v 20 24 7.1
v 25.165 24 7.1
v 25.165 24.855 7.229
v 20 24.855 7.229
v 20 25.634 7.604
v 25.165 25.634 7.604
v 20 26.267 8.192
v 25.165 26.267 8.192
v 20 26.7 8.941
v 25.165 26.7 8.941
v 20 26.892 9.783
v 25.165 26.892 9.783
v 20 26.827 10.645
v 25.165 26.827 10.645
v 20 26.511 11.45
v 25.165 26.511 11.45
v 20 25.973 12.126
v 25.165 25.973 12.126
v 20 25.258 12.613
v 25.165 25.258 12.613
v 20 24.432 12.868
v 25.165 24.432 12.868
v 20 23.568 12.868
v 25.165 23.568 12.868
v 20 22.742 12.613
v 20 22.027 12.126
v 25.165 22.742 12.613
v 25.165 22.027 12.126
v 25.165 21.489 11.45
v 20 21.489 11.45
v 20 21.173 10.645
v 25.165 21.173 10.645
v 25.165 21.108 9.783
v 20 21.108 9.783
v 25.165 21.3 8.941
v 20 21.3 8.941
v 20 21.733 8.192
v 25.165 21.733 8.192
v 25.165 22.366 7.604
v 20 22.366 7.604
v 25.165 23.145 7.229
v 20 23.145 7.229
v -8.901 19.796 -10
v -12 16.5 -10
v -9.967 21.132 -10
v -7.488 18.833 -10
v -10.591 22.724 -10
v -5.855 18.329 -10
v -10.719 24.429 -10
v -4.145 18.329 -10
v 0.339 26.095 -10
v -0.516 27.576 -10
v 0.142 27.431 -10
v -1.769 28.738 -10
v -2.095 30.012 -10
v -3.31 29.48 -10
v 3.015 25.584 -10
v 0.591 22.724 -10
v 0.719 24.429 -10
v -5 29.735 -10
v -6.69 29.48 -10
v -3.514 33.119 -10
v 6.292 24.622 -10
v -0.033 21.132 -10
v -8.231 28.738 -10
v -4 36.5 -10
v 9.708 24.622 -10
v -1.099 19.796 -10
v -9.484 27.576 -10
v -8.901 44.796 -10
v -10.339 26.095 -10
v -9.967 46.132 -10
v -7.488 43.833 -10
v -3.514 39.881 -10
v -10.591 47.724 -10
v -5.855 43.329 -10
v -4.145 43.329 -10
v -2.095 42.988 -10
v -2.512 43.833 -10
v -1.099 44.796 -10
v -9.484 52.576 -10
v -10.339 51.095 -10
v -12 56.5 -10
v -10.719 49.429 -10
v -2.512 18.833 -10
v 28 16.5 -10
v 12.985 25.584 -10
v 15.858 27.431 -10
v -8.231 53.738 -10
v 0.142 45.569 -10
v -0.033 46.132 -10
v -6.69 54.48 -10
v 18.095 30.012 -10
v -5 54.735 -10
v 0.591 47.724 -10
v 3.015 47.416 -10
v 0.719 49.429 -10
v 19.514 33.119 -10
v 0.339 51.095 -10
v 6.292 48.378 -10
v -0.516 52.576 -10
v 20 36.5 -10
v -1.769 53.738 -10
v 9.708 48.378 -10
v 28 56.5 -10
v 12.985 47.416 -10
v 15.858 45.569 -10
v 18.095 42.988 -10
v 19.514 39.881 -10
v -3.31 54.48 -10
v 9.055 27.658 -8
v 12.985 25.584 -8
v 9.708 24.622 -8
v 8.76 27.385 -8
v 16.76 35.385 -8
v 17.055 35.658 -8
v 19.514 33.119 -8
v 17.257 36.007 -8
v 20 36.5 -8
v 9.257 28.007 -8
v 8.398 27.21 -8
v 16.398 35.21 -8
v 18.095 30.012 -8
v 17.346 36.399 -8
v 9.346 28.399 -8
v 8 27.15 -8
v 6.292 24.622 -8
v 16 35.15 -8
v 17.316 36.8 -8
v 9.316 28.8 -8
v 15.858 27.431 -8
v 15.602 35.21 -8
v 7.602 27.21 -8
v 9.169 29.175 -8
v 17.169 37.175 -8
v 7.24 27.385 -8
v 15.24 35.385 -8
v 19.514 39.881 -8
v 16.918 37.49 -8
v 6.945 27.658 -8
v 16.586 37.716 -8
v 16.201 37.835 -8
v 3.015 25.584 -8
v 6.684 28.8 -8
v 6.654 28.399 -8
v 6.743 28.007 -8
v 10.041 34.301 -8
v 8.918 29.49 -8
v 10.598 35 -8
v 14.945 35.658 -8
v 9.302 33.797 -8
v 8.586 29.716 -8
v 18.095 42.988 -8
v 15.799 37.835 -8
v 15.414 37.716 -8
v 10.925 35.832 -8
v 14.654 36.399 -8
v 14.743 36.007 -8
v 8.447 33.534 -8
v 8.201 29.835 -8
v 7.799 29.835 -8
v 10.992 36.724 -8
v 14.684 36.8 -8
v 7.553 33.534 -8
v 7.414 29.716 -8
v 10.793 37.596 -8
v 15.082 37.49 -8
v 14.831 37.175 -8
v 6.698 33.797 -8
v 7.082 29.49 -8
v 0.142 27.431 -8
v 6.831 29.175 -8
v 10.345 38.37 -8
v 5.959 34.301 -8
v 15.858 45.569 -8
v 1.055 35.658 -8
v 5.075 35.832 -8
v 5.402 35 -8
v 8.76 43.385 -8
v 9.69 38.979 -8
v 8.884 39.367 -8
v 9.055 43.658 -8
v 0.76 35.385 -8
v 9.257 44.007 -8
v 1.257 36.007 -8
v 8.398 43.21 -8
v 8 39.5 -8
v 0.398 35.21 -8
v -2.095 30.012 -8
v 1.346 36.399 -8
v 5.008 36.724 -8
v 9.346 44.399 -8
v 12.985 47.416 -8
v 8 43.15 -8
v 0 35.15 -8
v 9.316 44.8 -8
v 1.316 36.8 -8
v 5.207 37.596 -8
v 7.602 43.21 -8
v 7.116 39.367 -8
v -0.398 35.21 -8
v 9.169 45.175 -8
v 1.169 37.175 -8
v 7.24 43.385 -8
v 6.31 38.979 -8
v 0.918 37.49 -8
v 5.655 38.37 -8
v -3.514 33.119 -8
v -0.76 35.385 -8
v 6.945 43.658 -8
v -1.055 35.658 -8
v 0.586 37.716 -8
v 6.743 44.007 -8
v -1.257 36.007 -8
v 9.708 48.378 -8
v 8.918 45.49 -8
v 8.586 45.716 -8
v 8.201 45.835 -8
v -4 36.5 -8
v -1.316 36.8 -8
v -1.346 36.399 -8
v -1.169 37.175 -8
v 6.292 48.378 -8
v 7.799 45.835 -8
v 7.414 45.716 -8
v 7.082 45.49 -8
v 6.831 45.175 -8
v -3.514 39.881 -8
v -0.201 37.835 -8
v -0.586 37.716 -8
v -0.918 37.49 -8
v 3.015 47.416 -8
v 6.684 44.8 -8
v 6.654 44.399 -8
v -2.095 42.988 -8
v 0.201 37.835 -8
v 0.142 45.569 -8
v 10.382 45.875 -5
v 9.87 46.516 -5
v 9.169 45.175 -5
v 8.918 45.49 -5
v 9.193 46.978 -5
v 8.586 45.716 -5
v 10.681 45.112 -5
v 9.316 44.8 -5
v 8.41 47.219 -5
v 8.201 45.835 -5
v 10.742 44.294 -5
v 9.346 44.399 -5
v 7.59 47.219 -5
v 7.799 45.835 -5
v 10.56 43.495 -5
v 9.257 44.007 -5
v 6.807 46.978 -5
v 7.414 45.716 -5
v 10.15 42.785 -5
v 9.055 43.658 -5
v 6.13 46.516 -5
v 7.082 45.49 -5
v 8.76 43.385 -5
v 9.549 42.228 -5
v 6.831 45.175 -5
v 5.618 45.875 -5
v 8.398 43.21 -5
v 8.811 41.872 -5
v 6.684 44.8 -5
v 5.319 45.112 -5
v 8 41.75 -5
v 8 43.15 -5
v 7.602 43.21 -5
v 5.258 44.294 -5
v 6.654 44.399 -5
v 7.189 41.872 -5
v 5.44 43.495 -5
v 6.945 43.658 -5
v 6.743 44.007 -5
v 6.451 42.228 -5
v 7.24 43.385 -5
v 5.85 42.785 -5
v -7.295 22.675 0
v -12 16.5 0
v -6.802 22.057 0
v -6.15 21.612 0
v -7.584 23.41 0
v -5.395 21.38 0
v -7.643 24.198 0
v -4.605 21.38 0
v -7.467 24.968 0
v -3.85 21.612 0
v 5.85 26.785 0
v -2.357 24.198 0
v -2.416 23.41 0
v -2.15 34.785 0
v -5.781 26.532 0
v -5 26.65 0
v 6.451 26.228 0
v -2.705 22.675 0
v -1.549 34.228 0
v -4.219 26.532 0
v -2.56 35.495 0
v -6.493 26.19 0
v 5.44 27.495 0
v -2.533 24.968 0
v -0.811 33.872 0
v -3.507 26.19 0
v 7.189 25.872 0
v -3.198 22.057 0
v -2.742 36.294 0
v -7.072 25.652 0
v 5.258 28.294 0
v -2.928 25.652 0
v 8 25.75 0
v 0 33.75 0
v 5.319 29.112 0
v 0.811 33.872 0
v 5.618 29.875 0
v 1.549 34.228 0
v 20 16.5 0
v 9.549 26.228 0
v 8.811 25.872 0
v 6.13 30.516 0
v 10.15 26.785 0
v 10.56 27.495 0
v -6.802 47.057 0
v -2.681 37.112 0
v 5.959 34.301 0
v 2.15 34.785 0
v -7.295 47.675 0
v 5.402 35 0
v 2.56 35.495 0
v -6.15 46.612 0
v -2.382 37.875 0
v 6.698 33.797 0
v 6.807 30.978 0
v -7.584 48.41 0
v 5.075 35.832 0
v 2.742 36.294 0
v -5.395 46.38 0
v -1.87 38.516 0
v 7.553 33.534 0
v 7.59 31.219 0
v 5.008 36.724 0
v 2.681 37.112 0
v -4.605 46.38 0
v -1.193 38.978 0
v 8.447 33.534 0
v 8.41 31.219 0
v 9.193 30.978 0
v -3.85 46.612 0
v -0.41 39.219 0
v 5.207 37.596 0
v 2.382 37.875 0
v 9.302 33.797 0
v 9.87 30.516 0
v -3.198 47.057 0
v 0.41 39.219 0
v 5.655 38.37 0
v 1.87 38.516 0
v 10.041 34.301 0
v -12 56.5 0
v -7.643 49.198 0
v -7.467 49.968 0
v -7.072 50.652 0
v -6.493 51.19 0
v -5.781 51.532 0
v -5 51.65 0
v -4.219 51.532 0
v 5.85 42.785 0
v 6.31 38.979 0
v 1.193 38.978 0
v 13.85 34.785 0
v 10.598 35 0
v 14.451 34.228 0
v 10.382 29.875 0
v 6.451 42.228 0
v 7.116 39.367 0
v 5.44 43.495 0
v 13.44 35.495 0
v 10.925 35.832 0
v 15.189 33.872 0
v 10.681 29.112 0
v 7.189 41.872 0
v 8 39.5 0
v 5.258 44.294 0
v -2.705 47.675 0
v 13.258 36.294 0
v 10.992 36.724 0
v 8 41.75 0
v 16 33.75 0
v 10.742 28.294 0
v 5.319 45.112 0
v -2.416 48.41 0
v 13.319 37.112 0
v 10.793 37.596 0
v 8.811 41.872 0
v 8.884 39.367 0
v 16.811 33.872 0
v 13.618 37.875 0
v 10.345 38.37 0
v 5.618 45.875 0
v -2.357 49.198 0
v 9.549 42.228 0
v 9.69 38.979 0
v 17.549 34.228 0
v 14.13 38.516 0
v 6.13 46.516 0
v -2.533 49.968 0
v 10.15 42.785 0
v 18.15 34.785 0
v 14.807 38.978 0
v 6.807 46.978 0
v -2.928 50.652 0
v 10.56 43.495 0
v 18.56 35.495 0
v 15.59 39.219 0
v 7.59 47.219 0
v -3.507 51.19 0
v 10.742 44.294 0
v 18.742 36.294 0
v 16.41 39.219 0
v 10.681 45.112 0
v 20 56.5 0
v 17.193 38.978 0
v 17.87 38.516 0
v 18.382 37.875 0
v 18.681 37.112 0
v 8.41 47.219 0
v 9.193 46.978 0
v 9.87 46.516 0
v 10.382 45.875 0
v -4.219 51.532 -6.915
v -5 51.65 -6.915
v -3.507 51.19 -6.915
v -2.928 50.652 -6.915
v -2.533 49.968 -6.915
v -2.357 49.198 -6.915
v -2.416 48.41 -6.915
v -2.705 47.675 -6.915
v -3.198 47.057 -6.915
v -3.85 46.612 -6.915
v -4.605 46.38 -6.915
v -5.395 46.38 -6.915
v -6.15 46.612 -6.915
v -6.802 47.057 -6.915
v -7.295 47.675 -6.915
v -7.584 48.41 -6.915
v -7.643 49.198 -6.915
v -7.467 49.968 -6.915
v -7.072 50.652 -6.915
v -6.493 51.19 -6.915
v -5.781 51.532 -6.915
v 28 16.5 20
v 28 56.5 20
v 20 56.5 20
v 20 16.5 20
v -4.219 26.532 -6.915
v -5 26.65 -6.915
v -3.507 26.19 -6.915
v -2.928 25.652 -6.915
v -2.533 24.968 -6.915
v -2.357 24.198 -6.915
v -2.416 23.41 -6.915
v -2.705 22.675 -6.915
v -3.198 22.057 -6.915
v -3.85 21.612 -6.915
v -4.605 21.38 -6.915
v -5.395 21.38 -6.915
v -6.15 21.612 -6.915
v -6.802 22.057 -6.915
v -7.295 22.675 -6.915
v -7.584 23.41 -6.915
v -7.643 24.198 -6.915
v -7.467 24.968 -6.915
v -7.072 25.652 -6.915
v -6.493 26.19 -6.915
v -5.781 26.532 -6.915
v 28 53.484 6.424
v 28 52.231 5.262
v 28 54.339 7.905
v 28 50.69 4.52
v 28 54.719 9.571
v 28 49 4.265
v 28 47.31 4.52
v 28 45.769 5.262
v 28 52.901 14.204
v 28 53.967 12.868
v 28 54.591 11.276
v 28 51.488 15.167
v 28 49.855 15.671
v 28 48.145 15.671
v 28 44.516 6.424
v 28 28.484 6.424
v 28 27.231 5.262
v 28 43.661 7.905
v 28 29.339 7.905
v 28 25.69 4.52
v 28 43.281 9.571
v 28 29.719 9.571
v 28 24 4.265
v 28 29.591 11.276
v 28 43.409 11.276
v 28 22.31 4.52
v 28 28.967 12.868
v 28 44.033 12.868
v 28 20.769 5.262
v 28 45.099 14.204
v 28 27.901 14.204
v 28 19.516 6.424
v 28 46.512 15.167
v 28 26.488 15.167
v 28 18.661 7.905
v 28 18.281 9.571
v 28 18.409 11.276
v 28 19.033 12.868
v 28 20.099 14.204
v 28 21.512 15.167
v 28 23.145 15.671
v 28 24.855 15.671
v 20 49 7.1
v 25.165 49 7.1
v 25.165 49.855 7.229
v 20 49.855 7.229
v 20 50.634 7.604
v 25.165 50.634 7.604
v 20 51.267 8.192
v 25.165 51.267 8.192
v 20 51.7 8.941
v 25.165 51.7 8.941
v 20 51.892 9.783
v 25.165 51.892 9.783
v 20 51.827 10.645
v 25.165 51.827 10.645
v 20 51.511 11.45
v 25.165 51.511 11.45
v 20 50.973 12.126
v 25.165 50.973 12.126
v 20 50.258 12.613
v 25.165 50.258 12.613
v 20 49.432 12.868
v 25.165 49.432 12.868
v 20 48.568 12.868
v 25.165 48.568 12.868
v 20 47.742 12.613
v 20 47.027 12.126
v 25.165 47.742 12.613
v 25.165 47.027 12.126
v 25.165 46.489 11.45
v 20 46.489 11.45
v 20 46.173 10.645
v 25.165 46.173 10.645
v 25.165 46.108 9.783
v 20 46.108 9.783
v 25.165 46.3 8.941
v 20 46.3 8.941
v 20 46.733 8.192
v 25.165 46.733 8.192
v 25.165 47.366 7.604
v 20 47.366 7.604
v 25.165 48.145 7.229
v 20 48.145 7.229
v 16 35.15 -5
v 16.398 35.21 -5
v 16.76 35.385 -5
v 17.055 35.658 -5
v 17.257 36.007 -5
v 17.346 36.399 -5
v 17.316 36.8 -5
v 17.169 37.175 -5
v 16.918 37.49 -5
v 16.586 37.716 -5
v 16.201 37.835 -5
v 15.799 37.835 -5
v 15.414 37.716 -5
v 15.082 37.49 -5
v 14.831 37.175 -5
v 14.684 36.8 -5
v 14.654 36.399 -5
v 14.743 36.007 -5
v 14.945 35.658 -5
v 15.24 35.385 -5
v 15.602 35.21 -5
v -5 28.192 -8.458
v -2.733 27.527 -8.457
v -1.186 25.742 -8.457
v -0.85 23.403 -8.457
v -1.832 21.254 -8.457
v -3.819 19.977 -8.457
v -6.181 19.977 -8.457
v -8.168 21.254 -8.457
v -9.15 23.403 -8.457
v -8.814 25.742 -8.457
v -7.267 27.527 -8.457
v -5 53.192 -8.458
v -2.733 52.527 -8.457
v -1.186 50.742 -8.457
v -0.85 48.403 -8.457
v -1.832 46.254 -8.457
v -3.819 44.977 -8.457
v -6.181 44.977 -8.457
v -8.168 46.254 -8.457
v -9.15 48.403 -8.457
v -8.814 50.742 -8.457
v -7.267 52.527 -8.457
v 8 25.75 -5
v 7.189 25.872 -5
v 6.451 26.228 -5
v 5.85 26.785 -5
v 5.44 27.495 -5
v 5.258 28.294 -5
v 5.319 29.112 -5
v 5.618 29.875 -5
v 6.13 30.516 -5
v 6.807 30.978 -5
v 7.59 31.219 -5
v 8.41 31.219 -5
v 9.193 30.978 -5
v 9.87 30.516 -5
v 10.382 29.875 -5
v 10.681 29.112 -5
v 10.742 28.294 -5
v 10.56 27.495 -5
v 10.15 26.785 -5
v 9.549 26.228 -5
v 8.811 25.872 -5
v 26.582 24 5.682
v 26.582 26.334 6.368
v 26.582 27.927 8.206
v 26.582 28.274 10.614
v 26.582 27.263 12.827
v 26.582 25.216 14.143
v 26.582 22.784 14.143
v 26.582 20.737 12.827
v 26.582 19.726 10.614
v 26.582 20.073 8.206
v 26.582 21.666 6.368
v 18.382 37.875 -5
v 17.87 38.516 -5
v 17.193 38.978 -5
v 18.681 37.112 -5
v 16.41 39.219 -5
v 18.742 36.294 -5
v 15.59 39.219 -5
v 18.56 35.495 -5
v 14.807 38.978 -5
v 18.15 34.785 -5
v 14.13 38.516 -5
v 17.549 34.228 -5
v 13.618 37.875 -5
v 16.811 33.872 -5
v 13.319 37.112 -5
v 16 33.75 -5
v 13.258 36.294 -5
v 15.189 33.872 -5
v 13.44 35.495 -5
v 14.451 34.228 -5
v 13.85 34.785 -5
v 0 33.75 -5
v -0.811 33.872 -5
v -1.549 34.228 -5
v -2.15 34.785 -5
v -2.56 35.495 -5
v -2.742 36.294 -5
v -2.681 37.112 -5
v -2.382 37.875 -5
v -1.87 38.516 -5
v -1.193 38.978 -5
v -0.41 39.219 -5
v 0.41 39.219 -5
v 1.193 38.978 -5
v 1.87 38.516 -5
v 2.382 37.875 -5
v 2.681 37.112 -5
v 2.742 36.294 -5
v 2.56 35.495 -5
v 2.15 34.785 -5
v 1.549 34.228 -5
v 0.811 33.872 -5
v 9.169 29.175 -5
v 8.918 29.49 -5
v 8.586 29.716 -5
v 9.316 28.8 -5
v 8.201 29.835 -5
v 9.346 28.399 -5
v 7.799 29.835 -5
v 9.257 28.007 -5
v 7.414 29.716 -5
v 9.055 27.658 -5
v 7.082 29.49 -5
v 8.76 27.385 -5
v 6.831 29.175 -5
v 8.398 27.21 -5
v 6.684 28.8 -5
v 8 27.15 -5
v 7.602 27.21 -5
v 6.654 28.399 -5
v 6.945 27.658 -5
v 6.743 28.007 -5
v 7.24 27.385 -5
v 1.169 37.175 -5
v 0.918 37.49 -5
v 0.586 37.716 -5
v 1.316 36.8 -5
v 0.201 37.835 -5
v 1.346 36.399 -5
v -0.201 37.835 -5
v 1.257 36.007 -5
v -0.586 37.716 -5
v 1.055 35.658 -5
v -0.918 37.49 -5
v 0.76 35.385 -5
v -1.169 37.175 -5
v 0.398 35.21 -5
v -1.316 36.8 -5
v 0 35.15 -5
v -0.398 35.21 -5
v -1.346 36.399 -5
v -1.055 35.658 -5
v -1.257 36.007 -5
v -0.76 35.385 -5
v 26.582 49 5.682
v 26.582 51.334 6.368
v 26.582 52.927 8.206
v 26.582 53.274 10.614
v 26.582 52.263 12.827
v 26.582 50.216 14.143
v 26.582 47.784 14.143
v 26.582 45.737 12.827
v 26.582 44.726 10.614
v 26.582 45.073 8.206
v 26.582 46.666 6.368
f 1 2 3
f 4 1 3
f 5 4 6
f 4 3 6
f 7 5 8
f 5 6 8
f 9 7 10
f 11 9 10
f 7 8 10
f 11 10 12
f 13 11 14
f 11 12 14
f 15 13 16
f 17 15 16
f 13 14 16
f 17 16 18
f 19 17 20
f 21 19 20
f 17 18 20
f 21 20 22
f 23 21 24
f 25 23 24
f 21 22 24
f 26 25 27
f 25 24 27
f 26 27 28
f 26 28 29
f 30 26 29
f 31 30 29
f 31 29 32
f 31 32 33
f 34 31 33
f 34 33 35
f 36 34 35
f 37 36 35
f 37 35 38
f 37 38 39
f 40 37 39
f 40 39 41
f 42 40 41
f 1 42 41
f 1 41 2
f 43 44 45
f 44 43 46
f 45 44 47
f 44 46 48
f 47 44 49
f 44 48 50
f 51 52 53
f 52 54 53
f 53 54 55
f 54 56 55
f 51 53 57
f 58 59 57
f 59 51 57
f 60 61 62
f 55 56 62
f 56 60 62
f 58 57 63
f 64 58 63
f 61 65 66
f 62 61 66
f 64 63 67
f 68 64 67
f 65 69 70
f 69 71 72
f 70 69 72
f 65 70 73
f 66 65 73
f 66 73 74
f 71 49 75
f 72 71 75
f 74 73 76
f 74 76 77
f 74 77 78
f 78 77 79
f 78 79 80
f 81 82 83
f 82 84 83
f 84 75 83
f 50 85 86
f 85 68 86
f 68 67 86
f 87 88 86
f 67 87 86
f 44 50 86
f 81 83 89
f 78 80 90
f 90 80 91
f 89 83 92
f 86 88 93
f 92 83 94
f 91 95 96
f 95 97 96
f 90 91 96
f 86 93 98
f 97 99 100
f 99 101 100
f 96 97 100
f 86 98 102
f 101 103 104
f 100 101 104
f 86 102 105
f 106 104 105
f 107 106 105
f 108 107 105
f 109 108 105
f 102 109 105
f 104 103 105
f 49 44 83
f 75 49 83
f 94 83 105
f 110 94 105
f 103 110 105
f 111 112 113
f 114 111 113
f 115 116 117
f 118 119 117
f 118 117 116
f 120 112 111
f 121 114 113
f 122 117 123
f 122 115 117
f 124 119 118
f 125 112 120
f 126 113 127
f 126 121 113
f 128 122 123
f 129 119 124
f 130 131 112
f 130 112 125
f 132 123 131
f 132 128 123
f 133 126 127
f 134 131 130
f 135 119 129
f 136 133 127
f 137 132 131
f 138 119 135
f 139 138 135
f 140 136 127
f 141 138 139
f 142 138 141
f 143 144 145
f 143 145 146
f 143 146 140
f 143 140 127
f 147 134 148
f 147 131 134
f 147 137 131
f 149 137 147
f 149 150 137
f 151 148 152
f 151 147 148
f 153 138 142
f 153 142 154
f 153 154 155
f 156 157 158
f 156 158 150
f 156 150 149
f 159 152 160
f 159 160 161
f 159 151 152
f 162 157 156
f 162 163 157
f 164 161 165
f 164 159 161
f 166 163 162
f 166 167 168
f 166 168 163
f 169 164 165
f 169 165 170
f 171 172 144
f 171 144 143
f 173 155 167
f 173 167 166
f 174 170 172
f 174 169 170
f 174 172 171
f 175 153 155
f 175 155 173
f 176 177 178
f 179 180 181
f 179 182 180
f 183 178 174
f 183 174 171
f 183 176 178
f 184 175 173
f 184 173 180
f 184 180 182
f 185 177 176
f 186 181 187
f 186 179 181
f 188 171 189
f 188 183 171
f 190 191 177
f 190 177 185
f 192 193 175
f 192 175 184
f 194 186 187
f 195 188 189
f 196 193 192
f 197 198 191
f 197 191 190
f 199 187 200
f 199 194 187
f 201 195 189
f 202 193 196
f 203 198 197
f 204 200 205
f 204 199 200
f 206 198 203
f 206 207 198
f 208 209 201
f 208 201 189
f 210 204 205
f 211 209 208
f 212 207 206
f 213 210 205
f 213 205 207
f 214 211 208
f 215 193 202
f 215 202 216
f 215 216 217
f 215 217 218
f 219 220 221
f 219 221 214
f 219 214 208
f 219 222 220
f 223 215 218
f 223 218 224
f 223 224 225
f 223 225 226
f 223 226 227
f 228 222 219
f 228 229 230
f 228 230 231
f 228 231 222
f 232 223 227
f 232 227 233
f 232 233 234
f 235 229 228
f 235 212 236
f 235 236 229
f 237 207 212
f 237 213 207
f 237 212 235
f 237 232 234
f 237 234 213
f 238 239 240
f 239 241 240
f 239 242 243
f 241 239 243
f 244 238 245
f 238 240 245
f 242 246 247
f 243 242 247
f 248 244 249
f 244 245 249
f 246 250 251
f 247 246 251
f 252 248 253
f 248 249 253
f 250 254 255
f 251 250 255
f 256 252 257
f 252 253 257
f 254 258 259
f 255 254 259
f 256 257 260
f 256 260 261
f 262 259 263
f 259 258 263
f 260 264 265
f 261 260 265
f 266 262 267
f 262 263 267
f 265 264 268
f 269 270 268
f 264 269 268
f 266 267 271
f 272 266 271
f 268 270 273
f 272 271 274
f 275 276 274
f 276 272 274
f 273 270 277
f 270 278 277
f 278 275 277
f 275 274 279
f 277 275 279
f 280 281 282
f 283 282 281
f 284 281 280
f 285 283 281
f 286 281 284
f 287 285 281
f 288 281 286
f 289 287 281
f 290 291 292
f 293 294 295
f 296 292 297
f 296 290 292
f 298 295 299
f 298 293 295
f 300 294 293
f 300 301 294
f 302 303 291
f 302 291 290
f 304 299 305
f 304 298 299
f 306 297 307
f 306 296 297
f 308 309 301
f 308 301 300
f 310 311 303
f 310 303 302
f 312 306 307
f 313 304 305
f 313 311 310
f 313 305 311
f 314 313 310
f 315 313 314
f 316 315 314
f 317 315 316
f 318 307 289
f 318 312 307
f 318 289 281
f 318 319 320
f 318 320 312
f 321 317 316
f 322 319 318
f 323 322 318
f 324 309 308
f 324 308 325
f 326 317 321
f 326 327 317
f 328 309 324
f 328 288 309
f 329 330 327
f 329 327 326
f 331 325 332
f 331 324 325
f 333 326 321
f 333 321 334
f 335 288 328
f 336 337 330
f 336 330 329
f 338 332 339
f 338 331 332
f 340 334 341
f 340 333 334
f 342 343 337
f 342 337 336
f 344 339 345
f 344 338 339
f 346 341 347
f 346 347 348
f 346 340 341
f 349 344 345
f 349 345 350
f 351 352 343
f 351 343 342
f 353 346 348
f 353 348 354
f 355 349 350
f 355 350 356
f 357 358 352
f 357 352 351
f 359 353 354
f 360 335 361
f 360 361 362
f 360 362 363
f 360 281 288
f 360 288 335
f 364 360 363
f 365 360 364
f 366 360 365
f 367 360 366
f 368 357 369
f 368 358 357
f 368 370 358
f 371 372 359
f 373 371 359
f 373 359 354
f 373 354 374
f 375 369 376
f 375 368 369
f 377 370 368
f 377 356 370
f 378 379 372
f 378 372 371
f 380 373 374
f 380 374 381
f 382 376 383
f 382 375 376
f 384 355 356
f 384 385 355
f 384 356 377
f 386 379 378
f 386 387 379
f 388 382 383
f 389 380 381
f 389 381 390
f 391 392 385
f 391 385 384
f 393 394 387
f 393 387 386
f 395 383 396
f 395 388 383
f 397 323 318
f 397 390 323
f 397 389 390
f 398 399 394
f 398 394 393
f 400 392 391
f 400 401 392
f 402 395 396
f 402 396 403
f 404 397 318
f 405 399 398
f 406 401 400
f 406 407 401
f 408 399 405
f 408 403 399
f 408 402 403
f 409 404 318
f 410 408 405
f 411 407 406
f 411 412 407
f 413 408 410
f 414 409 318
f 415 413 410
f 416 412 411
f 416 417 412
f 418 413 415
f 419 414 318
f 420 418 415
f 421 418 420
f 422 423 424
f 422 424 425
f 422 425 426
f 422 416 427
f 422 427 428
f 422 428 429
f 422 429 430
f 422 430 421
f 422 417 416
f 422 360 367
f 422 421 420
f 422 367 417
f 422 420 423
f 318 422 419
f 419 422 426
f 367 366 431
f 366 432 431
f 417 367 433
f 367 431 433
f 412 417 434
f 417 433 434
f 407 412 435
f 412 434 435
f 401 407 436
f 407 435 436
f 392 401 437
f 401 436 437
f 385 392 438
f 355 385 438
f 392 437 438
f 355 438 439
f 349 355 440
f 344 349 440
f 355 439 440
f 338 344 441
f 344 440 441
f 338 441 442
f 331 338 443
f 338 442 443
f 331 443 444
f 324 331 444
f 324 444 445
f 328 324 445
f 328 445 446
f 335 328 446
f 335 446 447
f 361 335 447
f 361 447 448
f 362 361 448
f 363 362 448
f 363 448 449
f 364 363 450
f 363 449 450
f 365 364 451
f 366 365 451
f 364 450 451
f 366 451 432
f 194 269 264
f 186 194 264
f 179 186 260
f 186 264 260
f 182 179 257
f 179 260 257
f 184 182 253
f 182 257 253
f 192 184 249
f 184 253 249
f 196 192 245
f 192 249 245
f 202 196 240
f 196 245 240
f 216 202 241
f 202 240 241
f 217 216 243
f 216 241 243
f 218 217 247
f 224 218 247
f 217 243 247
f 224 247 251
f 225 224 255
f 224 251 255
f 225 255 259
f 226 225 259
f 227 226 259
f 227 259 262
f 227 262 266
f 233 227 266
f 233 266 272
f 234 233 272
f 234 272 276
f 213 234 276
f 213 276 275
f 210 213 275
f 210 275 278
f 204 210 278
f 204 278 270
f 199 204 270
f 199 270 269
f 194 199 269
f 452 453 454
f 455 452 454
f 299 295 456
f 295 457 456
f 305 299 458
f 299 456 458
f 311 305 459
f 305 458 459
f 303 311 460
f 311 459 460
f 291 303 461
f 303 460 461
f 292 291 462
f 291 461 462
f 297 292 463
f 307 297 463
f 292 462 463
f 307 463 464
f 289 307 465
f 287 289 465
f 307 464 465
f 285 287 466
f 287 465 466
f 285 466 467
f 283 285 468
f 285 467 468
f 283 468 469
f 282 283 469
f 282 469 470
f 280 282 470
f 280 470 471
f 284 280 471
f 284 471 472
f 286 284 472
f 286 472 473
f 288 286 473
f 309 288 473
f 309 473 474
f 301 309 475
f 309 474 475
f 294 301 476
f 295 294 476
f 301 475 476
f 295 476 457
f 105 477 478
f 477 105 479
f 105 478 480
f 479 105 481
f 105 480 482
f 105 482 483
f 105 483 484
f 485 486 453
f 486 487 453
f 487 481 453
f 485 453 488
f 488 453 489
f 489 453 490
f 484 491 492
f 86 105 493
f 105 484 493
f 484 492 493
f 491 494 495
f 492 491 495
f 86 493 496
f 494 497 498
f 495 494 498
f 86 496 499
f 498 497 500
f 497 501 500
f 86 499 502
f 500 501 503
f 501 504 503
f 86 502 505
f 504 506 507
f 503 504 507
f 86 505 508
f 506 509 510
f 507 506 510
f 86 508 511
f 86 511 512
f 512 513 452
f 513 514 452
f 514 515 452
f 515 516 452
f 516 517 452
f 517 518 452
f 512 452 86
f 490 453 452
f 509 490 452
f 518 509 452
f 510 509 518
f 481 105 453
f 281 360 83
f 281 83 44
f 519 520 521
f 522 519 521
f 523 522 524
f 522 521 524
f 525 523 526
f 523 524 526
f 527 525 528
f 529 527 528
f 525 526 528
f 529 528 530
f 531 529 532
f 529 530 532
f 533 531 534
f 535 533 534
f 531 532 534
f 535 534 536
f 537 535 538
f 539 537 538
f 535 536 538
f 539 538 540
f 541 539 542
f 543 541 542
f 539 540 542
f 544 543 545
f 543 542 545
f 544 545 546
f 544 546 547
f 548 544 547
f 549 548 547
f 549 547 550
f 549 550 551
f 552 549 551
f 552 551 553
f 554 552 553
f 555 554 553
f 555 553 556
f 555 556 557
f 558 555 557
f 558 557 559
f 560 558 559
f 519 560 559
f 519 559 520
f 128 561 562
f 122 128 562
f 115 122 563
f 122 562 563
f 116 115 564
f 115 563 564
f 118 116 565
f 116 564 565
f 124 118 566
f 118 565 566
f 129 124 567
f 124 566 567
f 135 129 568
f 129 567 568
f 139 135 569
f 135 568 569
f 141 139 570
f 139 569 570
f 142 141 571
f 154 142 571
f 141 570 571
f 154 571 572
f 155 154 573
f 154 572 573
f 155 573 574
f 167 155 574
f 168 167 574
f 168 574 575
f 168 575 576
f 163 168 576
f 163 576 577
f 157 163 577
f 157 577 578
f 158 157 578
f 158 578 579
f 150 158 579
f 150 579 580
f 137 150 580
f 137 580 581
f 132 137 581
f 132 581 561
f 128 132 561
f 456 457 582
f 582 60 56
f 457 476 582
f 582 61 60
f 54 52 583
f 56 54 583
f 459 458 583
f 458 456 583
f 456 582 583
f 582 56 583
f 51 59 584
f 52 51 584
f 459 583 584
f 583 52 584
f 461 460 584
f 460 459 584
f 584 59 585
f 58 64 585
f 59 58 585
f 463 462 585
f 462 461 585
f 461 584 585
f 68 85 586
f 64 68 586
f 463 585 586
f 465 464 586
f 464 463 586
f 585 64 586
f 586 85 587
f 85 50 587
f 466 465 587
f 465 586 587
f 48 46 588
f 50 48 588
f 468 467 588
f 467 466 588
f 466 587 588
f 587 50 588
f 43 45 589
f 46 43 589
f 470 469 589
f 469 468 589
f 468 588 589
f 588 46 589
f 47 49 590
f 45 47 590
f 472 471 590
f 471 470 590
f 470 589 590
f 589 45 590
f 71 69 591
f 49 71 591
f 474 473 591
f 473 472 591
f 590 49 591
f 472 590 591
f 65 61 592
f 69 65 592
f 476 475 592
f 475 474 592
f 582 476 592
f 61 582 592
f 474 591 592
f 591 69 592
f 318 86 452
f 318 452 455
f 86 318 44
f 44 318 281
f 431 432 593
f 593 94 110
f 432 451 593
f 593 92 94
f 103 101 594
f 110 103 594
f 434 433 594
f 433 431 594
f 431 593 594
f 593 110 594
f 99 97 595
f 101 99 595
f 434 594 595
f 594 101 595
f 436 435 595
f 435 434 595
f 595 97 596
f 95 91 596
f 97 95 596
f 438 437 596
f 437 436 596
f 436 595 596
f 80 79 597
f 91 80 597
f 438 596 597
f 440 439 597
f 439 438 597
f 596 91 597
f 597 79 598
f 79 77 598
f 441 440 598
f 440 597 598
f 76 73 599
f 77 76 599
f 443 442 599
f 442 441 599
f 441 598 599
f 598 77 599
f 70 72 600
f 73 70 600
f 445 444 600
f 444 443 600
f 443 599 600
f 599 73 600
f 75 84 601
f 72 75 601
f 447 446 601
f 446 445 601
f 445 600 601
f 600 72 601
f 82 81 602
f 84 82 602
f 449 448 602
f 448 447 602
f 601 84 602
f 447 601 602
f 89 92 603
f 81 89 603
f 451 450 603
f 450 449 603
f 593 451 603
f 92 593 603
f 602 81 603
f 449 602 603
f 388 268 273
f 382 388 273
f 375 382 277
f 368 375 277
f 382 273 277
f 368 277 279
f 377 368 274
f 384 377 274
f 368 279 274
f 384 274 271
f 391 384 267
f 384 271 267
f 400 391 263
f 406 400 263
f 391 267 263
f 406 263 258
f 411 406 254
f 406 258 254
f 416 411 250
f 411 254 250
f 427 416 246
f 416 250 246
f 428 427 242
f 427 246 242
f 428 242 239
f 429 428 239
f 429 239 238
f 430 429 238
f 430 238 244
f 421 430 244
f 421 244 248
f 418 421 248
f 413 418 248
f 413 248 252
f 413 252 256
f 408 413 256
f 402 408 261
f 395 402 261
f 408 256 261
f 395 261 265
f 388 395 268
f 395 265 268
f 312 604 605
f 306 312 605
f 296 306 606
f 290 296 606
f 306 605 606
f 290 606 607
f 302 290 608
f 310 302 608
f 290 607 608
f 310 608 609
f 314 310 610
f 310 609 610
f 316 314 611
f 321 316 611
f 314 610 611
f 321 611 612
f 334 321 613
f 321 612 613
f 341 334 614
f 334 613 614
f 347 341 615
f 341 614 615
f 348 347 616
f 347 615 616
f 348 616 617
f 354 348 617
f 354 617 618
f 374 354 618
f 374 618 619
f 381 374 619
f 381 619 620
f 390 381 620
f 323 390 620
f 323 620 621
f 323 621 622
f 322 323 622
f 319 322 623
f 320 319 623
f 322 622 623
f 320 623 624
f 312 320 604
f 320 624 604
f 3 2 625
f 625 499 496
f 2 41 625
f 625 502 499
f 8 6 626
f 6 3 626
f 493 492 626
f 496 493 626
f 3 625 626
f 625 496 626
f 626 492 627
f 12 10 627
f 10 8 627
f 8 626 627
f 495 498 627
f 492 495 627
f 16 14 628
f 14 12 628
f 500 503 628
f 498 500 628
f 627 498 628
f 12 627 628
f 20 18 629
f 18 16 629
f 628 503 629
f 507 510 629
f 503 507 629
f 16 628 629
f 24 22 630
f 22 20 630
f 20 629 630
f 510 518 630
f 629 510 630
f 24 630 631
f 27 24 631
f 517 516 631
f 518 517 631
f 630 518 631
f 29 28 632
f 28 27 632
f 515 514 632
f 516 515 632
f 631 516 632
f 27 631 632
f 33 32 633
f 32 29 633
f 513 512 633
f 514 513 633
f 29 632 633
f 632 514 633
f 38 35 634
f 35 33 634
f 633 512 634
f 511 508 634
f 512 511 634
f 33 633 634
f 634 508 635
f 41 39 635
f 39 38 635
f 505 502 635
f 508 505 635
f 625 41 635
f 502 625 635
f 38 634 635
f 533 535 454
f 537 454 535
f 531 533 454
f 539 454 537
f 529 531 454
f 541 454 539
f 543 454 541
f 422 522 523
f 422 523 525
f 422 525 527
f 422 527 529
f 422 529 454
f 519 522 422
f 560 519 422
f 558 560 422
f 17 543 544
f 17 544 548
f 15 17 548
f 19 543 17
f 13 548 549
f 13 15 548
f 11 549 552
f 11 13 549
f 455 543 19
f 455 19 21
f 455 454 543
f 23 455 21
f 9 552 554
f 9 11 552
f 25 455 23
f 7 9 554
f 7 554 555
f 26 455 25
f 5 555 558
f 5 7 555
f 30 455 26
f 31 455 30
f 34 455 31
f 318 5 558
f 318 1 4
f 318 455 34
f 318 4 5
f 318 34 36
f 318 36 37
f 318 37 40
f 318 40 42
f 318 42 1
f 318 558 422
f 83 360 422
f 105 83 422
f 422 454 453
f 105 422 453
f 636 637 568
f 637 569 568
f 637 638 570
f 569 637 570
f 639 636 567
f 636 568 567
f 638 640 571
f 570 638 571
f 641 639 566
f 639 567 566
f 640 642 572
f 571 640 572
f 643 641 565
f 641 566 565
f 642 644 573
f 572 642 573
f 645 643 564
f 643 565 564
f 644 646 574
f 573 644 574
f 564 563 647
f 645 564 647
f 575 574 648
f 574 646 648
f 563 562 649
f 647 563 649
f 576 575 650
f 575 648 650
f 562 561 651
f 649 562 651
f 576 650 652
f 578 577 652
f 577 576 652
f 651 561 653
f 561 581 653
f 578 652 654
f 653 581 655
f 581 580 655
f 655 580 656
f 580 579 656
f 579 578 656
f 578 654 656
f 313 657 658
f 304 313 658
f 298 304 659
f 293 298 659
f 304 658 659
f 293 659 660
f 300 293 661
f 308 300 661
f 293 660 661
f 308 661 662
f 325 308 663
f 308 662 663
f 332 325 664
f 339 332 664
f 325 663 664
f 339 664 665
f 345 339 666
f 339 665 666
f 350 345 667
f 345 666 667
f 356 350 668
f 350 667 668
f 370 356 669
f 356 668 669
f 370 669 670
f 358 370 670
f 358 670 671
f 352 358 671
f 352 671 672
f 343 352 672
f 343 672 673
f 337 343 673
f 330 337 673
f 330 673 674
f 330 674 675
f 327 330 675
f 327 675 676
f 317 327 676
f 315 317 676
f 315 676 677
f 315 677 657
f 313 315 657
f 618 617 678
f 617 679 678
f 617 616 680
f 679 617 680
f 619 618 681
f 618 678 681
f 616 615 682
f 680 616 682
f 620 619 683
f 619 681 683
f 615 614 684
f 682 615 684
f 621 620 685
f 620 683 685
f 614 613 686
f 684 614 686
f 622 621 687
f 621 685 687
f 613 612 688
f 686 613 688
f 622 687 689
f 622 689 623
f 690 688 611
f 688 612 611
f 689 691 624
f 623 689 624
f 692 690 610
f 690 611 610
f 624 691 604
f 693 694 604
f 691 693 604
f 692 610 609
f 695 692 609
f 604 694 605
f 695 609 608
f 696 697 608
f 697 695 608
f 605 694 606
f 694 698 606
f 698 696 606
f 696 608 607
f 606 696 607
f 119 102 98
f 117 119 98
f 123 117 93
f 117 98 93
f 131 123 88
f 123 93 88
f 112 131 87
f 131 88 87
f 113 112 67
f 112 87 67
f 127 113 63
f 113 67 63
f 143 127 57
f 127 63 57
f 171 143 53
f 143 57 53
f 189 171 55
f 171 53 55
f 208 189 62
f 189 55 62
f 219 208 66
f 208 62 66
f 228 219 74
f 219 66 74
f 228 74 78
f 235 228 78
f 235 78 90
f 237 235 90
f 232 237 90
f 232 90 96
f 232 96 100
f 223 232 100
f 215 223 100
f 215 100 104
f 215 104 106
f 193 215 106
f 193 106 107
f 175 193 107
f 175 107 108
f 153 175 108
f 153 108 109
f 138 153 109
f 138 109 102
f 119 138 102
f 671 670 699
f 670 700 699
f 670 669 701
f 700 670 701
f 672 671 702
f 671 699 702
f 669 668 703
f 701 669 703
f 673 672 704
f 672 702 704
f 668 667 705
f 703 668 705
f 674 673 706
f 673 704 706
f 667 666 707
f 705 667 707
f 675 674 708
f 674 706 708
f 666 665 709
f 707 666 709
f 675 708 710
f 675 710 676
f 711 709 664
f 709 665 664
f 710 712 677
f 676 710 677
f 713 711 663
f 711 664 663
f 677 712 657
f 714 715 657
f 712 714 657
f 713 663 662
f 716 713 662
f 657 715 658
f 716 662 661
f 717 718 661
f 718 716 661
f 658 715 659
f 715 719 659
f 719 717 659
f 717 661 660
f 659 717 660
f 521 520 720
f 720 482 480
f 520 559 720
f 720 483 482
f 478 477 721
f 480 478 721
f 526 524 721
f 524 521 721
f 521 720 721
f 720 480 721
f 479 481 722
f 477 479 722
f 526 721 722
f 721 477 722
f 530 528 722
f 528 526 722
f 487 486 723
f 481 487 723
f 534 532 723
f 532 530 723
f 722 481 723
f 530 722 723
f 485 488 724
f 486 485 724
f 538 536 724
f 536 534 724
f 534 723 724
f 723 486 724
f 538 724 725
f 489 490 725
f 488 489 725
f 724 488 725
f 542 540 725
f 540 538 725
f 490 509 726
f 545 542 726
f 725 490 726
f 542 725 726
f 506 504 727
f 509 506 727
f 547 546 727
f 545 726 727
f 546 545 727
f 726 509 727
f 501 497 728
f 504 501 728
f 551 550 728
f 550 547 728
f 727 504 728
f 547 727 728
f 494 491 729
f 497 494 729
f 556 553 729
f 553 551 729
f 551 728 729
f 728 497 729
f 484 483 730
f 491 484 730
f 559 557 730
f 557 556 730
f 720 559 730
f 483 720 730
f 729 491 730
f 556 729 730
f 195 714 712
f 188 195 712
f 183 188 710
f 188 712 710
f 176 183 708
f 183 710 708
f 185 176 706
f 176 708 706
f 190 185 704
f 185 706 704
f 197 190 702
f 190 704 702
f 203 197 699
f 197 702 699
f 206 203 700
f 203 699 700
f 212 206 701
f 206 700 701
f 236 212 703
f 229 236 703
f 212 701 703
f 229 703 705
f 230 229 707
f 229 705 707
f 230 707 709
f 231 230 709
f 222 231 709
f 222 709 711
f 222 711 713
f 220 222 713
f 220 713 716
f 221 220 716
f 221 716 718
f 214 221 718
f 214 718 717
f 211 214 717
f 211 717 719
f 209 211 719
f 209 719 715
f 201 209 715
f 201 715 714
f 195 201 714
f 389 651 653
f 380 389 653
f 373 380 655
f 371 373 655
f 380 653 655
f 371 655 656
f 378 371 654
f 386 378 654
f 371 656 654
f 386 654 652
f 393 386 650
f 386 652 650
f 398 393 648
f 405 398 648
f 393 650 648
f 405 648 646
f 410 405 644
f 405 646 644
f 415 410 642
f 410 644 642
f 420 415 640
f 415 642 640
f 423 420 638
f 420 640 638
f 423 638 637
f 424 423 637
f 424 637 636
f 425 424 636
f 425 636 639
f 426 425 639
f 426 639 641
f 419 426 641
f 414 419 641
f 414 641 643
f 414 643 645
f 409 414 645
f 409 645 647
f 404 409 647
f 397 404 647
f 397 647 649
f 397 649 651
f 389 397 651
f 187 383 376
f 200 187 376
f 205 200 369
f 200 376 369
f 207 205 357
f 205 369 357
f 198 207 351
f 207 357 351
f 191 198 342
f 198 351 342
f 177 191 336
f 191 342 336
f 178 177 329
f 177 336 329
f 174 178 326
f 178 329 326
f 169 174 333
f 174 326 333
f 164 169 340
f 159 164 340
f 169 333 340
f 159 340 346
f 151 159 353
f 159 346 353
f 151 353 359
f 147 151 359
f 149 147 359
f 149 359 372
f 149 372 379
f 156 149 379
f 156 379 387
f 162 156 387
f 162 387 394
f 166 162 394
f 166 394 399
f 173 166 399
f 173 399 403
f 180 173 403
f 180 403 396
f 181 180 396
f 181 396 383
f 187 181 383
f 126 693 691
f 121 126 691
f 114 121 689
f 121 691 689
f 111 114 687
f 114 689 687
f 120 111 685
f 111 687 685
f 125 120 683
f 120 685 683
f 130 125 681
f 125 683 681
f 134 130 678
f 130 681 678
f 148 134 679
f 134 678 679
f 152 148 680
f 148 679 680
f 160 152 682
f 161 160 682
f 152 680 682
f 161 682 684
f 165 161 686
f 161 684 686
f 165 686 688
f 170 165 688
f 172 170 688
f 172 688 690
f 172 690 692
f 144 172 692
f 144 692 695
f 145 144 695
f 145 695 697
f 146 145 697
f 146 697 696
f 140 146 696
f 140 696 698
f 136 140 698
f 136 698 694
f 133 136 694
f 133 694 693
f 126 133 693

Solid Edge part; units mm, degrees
sketch "Sketch1" plane through (0, 0, 0) normal (0, 0, -1) x (-1, 0, 0)
  line L0 (12, 56.5) -> (12, 16.5)
  line L1 (-28, 16.5) -> (12, 16.5)
  line L2 (-28, 56.5) -> (-28, 16.5)
  line L3 (12, 56.5) -> (-28, 56.5)
  dimension "D1" = 40
  dimension "D2" = 40
extrude "Protrusion1" add sketch "Sketch1" along normal blind 10
sketch "Sketch2" plane through (8, 16.5, -5) normal (0, -1, 0) x (1, 0, 0)
  line L0 (12, 25) -> (12, 5)
  line L1 (12, 5) -> (20, 5)
  line L2 (20, 5) -> (20, 25)
  line L3 (20, 25) -> (12, 25)
  dimension "D1" = 20
  dimension "D2" = 8
extrude "Protrusion2" add sketch "Sketch2" against normal up to vertex (40 mm away)
sketch "Sketch3" plane through (8, 36.5, -10) normal (0, 0, -1) x (1, 0, 0)
  circle A0 centre (0, 0) radius 12
extrude "VaciadoExtruido_1" cut sketch "Sketch3" against normal blind 2
hole "Agujero_1" at (-5, 49, -10) direction (0, 0, 1) diameter 5.3 end up to next countersink diameter 11.47 countersink angle 90
hole "Hole1" at (-5, 24, -10) direction (0, 0, 1) diameter 5.3 end up to next countersink diameter 11.47 countersink angle 90
hole "Agujero_3" at (28, 49, 10) direction (-1, 0, 0) diameter 5.8 end up to next countersink diameter 11.47 countersink angle 90
hole "Hole2" at (28, 24, 10) direction (-1, 0, 0) diameter 5.8 end up to next countersink diameter 11.47 countersink angle 90
hole "Agujero_6" at (16, 36.5, 0) direction (0, 0, -1) diameter 2.7 end up to next counterbore diameter 5.5 counterbore depth 5
hole "Hole3" at (8, 28.5, 0) direction (0, 0, -1) diameter 2.7 end up to next counterbore diameter 5.5 counterbore depth 5
hole "Hole4" at (8, 44.5, 0) direction (0, 0, -1) diameter 2.7 end up to next counterbore diameter 5.5 counterbore depth 5
hole "Hole5" at (0, 36.5, 0) direction (0, 0, -1) diameter 2.7 end up to next counterbore diameter 5.5 counterbore depth 5
sketch "Sketch4" plane through (4, 36.5, 0) normal (0, 0, 1) x (0, 1, 0)
  circle A0 centre (0, -4) radius 3
  dimension "D1" = 6
extrude "Cutout1" cut sketch "Sketch4" against normal up to next
properties part number "1976-1500-007" material "Aluminio, 7075-T6"
